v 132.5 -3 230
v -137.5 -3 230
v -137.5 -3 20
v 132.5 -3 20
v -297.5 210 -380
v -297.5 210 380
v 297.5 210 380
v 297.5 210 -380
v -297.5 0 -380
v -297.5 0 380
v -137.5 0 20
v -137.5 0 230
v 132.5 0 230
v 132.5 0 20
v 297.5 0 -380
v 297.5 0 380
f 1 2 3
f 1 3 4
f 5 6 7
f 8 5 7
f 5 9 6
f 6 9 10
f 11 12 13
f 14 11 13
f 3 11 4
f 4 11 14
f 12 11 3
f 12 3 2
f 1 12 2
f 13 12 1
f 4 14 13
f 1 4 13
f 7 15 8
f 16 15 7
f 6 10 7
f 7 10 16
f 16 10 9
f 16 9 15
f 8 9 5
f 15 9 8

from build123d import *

# Parameters (mm, degrees)
F0_W     = 595
F0_H     = 760
F1_DEPTH = 210
F2_W     = 270
F2_H     = 210
F3_DEPTH = 3


with BuildPart() as f1:
    # F0 (on Front) → F1 (new body)
    with BuildSketch(Plane.XZ):
        Rectangle(F0_W, F0_H)
    extrude(amount=-F1_DEPTH)


with BuildPart() as f3:
    # F2 (on face) → F3 (new body)
    with BuildSketch(Plane.XZ):
        with Locations((-2.5, 125)):
            Rectangle(F2_W, F2_H)
    extrude(amount=F3_DEPTH)


solid = Compound([f1.part, f3.part])
